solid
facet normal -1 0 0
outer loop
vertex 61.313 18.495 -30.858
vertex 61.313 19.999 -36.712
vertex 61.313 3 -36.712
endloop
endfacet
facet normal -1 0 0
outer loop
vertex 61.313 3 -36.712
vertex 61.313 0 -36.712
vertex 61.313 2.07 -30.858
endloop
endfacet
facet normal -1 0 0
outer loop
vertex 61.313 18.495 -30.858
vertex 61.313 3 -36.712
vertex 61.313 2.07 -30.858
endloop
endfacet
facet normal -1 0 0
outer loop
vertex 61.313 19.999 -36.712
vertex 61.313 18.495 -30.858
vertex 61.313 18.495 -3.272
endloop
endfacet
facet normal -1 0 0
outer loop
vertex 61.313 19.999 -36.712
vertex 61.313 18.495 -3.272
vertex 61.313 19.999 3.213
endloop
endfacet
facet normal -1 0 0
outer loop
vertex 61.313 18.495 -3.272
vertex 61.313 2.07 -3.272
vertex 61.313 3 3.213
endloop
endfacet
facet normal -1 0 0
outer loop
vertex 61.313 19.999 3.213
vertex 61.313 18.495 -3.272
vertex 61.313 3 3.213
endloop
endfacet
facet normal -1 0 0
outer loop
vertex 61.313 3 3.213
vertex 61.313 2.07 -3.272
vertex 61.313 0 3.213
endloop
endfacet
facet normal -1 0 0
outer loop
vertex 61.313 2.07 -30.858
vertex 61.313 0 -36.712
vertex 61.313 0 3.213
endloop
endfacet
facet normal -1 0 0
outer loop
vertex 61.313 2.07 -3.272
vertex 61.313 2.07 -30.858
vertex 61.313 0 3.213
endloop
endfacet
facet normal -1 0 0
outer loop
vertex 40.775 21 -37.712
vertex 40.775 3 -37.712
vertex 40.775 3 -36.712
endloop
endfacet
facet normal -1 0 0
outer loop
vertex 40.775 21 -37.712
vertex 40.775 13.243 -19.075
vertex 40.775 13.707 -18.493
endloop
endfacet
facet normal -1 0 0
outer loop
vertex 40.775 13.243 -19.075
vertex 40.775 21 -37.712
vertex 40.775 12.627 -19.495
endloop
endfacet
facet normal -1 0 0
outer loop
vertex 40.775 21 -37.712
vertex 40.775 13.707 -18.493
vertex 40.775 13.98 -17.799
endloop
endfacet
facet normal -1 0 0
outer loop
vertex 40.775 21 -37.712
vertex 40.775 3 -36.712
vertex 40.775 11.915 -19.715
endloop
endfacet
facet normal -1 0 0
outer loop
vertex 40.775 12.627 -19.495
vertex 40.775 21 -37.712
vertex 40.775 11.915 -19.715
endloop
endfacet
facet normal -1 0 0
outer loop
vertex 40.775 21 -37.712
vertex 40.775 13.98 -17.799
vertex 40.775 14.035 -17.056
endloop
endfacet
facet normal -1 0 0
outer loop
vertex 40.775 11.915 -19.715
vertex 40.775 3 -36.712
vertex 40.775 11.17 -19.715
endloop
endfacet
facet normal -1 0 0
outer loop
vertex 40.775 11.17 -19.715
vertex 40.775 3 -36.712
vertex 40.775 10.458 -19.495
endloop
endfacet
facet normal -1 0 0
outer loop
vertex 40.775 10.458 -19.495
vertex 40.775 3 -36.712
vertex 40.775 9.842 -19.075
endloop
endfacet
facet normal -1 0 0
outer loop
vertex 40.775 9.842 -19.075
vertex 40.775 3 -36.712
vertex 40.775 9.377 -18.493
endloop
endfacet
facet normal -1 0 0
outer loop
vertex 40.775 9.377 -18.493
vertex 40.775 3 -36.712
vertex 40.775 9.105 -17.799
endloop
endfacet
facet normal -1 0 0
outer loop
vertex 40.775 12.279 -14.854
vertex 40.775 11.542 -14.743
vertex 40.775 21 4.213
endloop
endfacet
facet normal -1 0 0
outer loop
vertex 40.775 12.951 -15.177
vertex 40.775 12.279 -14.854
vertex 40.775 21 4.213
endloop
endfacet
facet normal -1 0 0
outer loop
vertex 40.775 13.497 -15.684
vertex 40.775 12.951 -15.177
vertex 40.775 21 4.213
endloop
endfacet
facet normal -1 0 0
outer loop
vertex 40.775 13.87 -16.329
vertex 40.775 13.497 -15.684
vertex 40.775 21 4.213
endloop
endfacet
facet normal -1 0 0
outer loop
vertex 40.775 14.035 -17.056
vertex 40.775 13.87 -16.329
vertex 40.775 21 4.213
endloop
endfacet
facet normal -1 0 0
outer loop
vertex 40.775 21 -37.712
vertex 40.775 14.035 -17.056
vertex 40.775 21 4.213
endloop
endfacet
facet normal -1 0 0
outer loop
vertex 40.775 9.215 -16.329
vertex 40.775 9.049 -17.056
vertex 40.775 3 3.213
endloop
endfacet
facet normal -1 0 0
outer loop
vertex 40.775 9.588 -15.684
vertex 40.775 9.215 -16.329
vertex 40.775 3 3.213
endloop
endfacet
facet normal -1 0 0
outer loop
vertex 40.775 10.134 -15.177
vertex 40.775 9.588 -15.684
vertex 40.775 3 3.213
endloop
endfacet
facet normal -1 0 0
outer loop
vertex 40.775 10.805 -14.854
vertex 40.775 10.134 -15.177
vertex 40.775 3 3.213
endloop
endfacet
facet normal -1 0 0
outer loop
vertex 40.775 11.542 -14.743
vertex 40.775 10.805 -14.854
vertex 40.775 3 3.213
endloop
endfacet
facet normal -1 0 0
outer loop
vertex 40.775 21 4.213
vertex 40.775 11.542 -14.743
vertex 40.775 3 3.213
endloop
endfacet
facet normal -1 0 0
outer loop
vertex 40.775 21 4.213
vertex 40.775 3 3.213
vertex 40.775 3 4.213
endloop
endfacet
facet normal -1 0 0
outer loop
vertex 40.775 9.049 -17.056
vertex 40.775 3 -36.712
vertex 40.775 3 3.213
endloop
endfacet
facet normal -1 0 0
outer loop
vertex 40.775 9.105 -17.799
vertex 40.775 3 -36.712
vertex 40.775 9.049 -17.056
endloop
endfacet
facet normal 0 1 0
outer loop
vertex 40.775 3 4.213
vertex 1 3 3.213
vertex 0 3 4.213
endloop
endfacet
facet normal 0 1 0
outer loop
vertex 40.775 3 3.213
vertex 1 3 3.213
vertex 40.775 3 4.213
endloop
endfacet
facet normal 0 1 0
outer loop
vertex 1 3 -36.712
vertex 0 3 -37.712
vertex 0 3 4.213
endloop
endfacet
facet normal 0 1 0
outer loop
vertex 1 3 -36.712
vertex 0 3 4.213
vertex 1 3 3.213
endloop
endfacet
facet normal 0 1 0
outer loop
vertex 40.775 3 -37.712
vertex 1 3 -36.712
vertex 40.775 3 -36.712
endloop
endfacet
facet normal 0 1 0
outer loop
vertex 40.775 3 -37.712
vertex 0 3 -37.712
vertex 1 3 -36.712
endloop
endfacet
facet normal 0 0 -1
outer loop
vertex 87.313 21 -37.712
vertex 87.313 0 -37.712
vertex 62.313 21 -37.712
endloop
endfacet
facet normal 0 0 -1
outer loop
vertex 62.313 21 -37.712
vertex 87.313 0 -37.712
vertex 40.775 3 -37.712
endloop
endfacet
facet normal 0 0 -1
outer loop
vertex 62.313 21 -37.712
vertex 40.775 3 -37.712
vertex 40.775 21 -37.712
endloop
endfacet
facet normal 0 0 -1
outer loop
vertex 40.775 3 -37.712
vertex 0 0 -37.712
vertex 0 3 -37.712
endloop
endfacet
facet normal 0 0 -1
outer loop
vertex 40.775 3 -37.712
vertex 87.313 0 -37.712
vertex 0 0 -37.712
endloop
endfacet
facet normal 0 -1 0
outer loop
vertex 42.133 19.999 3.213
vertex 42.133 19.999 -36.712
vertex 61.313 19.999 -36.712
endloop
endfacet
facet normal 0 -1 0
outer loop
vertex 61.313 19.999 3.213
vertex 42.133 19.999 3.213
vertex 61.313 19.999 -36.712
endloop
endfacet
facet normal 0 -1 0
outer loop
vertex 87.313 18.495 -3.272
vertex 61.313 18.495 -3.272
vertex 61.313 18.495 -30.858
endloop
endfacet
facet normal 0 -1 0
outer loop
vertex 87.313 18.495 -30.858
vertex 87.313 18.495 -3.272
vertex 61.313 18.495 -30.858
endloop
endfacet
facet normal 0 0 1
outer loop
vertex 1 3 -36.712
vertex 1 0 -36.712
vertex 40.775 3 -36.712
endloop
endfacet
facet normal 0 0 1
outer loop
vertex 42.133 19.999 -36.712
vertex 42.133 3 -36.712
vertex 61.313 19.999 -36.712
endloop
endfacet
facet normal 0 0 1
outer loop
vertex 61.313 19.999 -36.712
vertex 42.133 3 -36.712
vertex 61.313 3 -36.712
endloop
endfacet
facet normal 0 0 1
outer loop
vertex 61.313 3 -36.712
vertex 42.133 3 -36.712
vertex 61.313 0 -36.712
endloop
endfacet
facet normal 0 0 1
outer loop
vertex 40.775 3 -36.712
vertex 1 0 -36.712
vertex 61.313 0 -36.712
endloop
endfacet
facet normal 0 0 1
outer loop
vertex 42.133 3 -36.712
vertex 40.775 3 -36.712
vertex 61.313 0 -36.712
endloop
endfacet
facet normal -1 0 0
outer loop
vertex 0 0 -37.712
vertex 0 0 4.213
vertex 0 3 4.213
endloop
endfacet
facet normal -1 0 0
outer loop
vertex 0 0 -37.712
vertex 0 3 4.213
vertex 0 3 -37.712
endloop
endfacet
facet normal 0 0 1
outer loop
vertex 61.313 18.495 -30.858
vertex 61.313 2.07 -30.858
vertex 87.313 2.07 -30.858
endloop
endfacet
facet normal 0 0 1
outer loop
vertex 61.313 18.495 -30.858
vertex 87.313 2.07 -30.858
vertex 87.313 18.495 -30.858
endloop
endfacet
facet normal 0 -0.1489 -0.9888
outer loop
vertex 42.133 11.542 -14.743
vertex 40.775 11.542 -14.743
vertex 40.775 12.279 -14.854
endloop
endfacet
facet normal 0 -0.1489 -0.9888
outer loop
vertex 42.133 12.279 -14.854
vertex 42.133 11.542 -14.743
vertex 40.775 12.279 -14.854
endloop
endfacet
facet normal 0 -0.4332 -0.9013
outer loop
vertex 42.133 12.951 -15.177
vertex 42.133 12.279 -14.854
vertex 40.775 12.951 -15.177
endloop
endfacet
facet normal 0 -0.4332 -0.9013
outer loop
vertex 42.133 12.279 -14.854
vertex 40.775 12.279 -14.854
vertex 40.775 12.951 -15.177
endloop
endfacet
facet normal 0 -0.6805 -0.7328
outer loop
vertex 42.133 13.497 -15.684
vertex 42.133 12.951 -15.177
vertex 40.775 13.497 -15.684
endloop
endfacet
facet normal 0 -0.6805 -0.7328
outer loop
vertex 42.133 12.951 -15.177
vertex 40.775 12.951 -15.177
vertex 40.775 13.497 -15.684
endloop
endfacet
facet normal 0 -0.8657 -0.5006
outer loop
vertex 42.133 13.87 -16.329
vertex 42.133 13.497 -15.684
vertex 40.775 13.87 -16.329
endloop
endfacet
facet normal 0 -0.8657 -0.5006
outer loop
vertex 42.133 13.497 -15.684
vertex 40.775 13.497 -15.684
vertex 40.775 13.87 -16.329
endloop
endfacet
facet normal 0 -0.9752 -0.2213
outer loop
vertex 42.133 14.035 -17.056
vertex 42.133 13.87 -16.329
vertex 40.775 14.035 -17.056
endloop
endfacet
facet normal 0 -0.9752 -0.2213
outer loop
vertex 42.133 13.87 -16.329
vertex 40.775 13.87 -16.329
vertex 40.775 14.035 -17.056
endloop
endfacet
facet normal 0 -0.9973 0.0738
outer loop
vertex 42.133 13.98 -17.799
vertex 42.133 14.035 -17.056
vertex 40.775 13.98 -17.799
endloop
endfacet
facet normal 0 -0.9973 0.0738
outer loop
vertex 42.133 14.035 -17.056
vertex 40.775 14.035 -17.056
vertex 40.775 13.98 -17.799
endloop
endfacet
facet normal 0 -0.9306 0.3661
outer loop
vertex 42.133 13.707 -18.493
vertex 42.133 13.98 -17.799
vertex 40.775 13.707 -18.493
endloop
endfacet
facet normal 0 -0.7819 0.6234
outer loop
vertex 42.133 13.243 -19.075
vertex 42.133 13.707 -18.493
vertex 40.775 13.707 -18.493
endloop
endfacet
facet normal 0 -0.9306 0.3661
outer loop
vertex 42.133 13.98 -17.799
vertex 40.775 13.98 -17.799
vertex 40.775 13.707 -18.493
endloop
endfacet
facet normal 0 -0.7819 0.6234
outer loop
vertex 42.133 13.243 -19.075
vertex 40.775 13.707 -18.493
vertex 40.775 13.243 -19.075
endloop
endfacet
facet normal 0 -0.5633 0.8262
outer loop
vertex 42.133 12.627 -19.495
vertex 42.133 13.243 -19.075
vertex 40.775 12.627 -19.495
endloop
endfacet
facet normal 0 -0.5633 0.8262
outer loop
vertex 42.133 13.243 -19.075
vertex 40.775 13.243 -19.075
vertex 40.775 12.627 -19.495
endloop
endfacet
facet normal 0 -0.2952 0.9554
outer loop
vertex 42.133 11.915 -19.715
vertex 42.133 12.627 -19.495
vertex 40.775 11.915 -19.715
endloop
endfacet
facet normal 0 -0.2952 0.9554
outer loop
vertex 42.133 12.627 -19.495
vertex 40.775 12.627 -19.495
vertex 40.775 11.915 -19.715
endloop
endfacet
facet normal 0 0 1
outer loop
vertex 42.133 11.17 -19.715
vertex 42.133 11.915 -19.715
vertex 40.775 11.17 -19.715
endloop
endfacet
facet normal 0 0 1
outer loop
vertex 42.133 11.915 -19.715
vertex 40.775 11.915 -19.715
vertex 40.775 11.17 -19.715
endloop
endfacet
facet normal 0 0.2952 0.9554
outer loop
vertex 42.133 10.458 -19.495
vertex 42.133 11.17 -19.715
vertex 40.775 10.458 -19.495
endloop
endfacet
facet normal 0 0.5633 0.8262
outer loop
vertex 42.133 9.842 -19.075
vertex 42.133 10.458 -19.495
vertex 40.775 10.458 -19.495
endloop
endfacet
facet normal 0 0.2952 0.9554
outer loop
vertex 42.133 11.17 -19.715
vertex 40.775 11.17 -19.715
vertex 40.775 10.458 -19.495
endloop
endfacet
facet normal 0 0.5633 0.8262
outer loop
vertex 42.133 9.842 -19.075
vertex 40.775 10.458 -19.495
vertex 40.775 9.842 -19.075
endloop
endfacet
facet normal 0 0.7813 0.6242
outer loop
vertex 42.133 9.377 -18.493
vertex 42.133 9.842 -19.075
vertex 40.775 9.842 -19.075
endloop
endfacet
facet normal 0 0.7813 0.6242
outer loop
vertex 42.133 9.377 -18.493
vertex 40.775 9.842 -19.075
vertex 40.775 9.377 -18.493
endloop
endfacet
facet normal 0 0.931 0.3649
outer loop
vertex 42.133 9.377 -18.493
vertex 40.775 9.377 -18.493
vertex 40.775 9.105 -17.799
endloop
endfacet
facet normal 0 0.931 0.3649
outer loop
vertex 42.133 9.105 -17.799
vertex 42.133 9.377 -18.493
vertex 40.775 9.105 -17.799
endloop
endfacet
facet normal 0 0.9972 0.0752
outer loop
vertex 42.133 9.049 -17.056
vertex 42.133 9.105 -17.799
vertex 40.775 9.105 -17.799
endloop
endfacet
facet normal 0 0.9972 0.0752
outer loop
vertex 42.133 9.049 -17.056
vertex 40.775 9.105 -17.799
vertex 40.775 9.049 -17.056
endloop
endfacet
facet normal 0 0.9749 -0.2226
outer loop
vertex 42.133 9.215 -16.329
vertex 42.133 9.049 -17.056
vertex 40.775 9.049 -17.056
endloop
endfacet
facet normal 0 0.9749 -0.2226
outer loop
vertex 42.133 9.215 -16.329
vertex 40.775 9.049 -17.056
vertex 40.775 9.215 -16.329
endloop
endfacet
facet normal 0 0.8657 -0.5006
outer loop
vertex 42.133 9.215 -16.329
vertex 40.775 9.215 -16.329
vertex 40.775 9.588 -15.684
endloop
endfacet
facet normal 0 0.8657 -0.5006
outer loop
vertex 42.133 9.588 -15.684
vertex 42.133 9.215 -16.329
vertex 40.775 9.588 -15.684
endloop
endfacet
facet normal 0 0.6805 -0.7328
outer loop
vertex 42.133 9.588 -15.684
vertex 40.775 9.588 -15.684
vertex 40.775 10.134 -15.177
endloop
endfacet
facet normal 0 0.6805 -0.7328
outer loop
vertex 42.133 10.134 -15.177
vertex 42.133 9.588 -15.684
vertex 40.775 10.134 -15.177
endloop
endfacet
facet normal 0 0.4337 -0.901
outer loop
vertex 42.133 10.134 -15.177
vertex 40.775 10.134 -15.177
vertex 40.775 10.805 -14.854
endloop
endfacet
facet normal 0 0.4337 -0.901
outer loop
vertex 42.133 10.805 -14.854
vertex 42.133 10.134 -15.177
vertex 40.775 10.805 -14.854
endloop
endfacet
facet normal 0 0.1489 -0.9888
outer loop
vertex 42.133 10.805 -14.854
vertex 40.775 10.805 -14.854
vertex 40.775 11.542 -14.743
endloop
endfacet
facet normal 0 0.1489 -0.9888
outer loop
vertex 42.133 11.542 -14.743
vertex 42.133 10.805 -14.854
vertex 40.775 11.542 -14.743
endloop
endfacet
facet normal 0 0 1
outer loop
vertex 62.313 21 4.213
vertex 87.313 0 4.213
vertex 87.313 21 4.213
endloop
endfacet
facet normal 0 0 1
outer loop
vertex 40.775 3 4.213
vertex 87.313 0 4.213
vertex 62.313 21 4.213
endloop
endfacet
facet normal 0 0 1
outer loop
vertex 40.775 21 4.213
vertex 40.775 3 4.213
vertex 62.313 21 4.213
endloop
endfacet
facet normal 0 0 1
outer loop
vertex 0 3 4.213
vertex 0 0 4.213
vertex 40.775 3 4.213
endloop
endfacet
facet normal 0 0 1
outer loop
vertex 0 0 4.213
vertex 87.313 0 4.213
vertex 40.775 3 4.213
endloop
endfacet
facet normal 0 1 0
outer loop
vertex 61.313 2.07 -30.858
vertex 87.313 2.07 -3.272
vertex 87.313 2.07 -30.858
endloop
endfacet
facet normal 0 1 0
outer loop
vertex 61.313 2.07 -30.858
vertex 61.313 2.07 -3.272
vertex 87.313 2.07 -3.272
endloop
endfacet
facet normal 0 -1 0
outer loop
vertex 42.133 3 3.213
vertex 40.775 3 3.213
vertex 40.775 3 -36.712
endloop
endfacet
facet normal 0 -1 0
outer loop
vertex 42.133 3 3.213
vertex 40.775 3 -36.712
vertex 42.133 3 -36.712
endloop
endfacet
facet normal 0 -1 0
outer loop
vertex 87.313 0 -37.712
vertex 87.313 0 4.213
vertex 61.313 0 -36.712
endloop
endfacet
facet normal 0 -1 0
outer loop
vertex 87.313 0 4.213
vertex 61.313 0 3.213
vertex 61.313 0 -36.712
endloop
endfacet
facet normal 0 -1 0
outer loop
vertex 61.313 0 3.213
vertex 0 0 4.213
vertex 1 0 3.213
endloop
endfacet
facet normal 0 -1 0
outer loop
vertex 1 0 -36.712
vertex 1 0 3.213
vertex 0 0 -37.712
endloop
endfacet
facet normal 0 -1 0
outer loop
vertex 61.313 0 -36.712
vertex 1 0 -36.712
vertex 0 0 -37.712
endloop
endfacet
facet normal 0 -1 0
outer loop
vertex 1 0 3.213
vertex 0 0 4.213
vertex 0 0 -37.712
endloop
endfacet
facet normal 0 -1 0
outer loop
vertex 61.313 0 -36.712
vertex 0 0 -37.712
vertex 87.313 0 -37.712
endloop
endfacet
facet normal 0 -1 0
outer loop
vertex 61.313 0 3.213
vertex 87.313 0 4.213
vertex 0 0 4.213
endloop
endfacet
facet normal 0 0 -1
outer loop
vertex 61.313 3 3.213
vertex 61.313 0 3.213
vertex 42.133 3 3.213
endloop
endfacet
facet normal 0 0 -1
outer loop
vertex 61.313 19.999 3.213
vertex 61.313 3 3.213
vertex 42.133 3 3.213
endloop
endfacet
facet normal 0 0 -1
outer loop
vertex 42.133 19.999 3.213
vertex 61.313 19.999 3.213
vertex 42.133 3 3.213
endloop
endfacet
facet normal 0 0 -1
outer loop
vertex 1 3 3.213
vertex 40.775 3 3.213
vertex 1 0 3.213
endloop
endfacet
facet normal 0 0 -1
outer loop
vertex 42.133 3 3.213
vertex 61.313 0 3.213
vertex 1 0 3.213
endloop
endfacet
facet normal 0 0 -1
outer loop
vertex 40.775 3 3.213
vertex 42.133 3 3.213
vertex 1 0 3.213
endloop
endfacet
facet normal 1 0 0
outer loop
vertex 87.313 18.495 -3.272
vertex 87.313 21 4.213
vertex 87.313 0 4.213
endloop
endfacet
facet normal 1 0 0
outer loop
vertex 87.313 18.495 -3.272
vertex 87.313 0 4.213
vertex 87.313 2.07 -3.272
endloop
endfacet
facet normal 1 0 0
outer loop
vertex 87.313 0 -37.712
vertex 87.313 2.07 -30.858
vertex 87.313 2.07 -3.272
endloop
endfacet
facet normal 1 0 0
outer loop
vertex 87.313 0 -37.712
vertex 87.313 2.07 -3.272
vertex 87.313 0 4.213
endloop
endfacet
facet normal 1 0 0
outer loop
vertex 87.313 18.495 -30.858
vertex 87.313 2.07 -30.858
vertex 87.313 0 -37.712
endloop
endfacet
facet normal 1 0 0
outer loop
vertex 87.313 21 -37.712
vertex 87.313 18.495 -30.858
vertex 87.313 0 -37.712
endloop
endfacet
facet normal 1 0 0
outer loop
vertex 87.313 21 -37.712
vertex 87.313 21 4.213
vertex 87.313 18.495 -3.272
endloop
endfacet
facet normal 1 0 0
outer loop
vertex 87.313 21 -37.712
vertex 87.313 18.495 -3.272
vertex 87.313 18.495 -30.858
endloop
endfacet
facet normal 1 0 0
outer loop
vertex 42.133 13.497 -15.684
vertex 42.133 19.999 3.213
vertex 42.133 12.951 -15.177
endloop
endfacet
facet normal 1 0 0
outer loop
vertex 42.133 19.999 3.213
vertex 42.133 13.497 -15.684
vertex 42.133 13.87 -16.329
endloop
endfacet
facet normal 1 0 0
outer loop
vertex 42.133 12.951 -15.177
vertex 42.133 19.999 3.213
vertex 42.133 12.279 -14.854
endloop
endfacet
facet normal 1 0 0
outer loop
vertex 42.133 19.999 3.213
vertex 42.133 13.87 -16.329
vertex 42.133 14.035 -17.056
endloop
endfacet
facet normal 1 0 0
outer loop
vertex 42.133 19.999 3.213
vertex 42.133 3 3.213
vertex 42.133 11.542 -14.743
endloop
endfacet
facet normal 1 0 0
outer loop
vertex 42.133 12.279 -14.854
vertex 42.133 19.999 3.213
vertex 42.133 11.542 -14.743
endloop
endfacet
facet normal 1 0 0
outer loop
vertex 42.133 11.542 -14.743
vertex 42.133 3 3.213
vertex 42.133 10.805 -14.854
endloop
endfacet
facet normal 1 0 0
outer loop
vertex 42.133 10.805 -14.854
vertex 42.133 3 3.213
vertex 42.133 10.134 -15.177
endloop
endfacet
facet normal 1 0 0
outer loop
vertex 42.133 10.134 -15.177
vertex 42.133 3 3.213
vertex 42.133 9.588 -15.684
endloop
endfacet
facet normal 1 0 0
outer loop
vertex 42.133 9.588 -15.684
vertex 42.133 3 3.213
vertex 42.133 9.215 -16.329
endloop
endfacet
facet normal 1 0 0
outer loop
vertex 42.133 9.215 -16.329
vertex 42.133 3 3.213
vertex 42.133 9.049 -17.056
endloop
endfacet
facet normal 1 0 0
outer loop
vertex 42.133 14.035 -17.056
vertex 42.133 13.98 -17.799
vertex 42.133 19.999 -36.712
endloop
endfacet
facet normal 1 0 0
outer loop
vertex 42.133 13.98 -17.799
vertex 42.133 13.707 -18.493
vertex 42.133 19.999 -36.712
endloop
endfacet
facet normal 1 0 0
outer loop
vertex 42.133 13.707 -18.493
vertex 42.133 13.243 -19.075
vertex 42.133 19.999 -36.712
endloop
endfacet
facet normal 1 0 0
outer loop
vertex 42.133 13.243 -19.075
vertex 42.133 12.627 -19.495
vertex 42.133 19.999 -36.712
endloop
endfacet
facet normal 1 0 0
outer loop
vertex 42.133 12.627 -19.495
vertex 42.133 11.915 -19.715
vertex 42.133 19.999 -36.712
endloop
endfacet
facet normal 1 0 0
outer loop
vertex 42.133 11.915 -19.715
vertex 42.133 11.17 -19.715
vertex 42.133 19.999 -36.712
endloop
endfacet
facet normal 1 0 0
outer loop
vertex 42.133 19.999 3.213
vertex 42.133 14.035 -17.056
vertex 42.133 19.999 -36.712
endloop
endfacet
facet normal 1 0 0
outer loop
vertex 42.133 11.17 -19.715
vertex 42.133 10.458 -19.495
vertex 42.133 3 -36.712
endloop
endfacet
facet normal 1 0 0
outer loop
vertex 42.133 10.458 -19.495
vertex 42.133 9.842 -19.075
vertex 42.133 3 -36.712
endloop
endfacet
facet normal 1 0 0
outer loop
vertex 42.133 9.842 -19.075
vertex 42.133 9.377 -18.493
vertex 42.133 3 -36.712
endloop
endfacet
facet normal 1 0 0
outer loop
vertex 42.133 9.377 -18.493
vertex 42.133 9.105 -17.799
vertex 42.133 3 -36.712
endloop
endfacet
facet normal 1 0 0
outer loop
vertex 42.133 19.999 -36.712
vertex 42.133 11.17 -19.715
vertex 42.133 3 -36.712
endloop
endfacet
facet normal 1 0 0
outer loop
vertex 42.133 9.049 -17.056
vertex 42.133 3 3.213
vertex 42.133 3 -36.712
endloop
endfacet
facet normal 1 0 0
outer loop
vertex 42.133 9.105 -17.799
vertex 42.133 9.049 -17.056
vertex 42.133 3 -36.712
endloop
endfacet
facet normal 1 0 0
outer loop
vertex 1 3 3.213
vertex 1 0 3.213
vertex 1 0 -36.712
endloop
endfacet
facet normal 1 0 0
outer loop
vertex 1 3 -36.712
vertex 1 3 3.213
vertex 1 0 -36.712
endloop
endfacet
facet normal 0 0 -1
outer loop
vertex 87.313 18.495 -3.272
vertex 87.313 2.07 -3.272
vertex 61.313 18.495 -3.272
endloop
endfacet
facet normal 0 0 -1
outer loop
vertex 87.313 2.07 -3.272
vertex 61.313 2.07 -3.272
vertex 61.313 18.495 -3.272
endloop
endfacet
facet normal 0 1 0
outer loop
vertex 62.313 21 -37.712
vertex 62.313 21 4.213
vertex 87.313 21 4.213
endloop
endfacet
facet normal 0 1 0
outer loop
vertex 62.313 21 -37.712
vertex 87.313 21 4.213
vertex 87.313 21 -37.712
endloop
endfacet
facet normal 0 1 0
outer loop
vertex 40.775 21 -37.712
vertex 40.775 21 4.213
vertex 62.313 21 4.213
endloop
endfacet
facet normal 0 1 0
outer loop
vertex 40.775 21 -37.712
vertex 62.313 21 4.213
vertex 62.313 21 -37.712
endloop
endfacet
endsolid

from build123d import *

# Parameters (mm, degrees)
CROQUIS1_W              = 62.313372472
CROQUIS1_H              = 41.924750101
CROQUIS1_W_2            = 60.313372472
CROQUIS1_H_2            = 39.924750101
SALIENTE_EXTRUIR1_DEPTH = 3
CROQUIS3_W              = 1.357711699
CROQUIS3_H              = 39.924750101
CROQUIS3_H_2            = 1
SALIENTE_EXTRUIR2_DEPTH = 18
CROQUIS4_R              = 2.5
CORTAR_EXTRUIR1_DEPTH   = 60.378567465
CROQUIS5_W              = 19.180578122
CROQUIS5_H              = 1.001020226
SALIENTE_EXTRUIR3_DEPTH = 40
CROQUIS6_W              = 27.585602981
CROQUIS6_H              = 16.425068323
CORTAR_EXTRUIR2_DEPTH   = 5
CROQUIS7_W              = 41.924750101
CROQUIS7_H              = 21
CROQUIS7_W_2            = 27.585602981
CROQUIS7_H_2            = 16.425068323
SALIENTE_EXTRUIR4_DEPTH = 25


with BuildPart() as part:
    # Croquis1 → Saliente-Extruir1 (new body)
    with BuildSketch(Plane(origin=(0, 0, 0), x_dir=(1, 0, 0), z_dir=(0, 1, 0))):
        with Locations((31.156686236, 16.749783587)):
            Rectangle(CROQUIS1_W, CROQUIS1_H)
        with Locations((31.156686236, 16.749783587)):
            Rectangle(CROQUIS1_W_2, CROQUIS1_H_2, mode=Mode.SUBTRACT)
    extrude(amount=SALIENTE_EXTRUIR1_DEPTH)

    # Croquis3 → Saliente-Extruir2 (add)
    with BuildSketch(Plane(origin=(0, 3, 0), x_dir=(1, 0, 0), z_dir=(0, 1, 0))):
        with Locations((41.453938501, 16.749783587)):
            Rectangle(CROQUIS3_W, CROQUIS3_H)
        Polygon((42.13279435, -3.212591464), (42.13279435, -4.212591464), (62.313372472, -4.212591464), (62.313372472, 37.712158637), (42.13279435, 37.712158637), (42.13279435, 36.712158637), (61.313372472, 36.712158637), (61.313372472, -3.212591464), align=None)
        with Locations((41.453938501, -3.712591464)):
            Rectangle(CROQUIS3_W, CROQUIS3_H_2)
        with Locations((41.453938501, 37.212158637)):
            Rectangle(CROQUIS3_W, CROQUIS3_H_2)
    extrude(amount=SALIENTE_EXTRUIR2_DEPTH)

    # Croquis4 → Cortar-Extruir1 (cut, through all)
    with BuildSketch(Plane.ZY.offset(-40.775082651)):
        with Locations((-17.242511343, 11.542387771)):
            Circle(CROQUIS4_R)
    extrude(amount=-CORTAR_EXTRUIR1_DEPTH, mode=Mode.SUBTRACT)

    # Croquis5 → Saliente-Extruir3 (add)
    with BuildSketch(Plane.XY.offset(-36.712158637)):
        with Locations((51.723083411, 20.499489887)):
            Rectangle(CROQUIS5_W, CROQUIS5_H)
    extrude(amount=SALIENTE_EXTRUIR3_DEPTH)

    # Croquis6 → Cortar-Extruir2 (cut)
    with BuildSketch(Plane(origin=(62.313372472, 0, 0), x_dir=(0, 0, -1), z_dir=(1, 0, 0))):
        with Locations((17.064754598, 10.282718264)):
            Rectangle(CROQUIS6_W, CROQUIS6_H)
    extrude(amount=-CORTAR_EXTRUIR2_DEPTH, mode=Mode.SUBTRACT)

    # Croquis7 → Saliente-Extruir4 (add)
    with BuildSketch(Plane(origin=(62.313372472, 0, 0), x_dir=(0, 0, -1), z_dir=(1, 0, 0))):
        with Locations((16.749783587, 10.5)):
            Rectangle(CROQUIS7_W, CROQUIS7_H)
        with Locations((17.064754598, 10.282718264)):
            Rectangle(CROQUIS7_W_2, CROQUIS7_H_2, mode=Mode.SUBTRACT)
    extrude(amount=SALIENTE_EXTRUIR4_DEPTH)


solid = part.part
